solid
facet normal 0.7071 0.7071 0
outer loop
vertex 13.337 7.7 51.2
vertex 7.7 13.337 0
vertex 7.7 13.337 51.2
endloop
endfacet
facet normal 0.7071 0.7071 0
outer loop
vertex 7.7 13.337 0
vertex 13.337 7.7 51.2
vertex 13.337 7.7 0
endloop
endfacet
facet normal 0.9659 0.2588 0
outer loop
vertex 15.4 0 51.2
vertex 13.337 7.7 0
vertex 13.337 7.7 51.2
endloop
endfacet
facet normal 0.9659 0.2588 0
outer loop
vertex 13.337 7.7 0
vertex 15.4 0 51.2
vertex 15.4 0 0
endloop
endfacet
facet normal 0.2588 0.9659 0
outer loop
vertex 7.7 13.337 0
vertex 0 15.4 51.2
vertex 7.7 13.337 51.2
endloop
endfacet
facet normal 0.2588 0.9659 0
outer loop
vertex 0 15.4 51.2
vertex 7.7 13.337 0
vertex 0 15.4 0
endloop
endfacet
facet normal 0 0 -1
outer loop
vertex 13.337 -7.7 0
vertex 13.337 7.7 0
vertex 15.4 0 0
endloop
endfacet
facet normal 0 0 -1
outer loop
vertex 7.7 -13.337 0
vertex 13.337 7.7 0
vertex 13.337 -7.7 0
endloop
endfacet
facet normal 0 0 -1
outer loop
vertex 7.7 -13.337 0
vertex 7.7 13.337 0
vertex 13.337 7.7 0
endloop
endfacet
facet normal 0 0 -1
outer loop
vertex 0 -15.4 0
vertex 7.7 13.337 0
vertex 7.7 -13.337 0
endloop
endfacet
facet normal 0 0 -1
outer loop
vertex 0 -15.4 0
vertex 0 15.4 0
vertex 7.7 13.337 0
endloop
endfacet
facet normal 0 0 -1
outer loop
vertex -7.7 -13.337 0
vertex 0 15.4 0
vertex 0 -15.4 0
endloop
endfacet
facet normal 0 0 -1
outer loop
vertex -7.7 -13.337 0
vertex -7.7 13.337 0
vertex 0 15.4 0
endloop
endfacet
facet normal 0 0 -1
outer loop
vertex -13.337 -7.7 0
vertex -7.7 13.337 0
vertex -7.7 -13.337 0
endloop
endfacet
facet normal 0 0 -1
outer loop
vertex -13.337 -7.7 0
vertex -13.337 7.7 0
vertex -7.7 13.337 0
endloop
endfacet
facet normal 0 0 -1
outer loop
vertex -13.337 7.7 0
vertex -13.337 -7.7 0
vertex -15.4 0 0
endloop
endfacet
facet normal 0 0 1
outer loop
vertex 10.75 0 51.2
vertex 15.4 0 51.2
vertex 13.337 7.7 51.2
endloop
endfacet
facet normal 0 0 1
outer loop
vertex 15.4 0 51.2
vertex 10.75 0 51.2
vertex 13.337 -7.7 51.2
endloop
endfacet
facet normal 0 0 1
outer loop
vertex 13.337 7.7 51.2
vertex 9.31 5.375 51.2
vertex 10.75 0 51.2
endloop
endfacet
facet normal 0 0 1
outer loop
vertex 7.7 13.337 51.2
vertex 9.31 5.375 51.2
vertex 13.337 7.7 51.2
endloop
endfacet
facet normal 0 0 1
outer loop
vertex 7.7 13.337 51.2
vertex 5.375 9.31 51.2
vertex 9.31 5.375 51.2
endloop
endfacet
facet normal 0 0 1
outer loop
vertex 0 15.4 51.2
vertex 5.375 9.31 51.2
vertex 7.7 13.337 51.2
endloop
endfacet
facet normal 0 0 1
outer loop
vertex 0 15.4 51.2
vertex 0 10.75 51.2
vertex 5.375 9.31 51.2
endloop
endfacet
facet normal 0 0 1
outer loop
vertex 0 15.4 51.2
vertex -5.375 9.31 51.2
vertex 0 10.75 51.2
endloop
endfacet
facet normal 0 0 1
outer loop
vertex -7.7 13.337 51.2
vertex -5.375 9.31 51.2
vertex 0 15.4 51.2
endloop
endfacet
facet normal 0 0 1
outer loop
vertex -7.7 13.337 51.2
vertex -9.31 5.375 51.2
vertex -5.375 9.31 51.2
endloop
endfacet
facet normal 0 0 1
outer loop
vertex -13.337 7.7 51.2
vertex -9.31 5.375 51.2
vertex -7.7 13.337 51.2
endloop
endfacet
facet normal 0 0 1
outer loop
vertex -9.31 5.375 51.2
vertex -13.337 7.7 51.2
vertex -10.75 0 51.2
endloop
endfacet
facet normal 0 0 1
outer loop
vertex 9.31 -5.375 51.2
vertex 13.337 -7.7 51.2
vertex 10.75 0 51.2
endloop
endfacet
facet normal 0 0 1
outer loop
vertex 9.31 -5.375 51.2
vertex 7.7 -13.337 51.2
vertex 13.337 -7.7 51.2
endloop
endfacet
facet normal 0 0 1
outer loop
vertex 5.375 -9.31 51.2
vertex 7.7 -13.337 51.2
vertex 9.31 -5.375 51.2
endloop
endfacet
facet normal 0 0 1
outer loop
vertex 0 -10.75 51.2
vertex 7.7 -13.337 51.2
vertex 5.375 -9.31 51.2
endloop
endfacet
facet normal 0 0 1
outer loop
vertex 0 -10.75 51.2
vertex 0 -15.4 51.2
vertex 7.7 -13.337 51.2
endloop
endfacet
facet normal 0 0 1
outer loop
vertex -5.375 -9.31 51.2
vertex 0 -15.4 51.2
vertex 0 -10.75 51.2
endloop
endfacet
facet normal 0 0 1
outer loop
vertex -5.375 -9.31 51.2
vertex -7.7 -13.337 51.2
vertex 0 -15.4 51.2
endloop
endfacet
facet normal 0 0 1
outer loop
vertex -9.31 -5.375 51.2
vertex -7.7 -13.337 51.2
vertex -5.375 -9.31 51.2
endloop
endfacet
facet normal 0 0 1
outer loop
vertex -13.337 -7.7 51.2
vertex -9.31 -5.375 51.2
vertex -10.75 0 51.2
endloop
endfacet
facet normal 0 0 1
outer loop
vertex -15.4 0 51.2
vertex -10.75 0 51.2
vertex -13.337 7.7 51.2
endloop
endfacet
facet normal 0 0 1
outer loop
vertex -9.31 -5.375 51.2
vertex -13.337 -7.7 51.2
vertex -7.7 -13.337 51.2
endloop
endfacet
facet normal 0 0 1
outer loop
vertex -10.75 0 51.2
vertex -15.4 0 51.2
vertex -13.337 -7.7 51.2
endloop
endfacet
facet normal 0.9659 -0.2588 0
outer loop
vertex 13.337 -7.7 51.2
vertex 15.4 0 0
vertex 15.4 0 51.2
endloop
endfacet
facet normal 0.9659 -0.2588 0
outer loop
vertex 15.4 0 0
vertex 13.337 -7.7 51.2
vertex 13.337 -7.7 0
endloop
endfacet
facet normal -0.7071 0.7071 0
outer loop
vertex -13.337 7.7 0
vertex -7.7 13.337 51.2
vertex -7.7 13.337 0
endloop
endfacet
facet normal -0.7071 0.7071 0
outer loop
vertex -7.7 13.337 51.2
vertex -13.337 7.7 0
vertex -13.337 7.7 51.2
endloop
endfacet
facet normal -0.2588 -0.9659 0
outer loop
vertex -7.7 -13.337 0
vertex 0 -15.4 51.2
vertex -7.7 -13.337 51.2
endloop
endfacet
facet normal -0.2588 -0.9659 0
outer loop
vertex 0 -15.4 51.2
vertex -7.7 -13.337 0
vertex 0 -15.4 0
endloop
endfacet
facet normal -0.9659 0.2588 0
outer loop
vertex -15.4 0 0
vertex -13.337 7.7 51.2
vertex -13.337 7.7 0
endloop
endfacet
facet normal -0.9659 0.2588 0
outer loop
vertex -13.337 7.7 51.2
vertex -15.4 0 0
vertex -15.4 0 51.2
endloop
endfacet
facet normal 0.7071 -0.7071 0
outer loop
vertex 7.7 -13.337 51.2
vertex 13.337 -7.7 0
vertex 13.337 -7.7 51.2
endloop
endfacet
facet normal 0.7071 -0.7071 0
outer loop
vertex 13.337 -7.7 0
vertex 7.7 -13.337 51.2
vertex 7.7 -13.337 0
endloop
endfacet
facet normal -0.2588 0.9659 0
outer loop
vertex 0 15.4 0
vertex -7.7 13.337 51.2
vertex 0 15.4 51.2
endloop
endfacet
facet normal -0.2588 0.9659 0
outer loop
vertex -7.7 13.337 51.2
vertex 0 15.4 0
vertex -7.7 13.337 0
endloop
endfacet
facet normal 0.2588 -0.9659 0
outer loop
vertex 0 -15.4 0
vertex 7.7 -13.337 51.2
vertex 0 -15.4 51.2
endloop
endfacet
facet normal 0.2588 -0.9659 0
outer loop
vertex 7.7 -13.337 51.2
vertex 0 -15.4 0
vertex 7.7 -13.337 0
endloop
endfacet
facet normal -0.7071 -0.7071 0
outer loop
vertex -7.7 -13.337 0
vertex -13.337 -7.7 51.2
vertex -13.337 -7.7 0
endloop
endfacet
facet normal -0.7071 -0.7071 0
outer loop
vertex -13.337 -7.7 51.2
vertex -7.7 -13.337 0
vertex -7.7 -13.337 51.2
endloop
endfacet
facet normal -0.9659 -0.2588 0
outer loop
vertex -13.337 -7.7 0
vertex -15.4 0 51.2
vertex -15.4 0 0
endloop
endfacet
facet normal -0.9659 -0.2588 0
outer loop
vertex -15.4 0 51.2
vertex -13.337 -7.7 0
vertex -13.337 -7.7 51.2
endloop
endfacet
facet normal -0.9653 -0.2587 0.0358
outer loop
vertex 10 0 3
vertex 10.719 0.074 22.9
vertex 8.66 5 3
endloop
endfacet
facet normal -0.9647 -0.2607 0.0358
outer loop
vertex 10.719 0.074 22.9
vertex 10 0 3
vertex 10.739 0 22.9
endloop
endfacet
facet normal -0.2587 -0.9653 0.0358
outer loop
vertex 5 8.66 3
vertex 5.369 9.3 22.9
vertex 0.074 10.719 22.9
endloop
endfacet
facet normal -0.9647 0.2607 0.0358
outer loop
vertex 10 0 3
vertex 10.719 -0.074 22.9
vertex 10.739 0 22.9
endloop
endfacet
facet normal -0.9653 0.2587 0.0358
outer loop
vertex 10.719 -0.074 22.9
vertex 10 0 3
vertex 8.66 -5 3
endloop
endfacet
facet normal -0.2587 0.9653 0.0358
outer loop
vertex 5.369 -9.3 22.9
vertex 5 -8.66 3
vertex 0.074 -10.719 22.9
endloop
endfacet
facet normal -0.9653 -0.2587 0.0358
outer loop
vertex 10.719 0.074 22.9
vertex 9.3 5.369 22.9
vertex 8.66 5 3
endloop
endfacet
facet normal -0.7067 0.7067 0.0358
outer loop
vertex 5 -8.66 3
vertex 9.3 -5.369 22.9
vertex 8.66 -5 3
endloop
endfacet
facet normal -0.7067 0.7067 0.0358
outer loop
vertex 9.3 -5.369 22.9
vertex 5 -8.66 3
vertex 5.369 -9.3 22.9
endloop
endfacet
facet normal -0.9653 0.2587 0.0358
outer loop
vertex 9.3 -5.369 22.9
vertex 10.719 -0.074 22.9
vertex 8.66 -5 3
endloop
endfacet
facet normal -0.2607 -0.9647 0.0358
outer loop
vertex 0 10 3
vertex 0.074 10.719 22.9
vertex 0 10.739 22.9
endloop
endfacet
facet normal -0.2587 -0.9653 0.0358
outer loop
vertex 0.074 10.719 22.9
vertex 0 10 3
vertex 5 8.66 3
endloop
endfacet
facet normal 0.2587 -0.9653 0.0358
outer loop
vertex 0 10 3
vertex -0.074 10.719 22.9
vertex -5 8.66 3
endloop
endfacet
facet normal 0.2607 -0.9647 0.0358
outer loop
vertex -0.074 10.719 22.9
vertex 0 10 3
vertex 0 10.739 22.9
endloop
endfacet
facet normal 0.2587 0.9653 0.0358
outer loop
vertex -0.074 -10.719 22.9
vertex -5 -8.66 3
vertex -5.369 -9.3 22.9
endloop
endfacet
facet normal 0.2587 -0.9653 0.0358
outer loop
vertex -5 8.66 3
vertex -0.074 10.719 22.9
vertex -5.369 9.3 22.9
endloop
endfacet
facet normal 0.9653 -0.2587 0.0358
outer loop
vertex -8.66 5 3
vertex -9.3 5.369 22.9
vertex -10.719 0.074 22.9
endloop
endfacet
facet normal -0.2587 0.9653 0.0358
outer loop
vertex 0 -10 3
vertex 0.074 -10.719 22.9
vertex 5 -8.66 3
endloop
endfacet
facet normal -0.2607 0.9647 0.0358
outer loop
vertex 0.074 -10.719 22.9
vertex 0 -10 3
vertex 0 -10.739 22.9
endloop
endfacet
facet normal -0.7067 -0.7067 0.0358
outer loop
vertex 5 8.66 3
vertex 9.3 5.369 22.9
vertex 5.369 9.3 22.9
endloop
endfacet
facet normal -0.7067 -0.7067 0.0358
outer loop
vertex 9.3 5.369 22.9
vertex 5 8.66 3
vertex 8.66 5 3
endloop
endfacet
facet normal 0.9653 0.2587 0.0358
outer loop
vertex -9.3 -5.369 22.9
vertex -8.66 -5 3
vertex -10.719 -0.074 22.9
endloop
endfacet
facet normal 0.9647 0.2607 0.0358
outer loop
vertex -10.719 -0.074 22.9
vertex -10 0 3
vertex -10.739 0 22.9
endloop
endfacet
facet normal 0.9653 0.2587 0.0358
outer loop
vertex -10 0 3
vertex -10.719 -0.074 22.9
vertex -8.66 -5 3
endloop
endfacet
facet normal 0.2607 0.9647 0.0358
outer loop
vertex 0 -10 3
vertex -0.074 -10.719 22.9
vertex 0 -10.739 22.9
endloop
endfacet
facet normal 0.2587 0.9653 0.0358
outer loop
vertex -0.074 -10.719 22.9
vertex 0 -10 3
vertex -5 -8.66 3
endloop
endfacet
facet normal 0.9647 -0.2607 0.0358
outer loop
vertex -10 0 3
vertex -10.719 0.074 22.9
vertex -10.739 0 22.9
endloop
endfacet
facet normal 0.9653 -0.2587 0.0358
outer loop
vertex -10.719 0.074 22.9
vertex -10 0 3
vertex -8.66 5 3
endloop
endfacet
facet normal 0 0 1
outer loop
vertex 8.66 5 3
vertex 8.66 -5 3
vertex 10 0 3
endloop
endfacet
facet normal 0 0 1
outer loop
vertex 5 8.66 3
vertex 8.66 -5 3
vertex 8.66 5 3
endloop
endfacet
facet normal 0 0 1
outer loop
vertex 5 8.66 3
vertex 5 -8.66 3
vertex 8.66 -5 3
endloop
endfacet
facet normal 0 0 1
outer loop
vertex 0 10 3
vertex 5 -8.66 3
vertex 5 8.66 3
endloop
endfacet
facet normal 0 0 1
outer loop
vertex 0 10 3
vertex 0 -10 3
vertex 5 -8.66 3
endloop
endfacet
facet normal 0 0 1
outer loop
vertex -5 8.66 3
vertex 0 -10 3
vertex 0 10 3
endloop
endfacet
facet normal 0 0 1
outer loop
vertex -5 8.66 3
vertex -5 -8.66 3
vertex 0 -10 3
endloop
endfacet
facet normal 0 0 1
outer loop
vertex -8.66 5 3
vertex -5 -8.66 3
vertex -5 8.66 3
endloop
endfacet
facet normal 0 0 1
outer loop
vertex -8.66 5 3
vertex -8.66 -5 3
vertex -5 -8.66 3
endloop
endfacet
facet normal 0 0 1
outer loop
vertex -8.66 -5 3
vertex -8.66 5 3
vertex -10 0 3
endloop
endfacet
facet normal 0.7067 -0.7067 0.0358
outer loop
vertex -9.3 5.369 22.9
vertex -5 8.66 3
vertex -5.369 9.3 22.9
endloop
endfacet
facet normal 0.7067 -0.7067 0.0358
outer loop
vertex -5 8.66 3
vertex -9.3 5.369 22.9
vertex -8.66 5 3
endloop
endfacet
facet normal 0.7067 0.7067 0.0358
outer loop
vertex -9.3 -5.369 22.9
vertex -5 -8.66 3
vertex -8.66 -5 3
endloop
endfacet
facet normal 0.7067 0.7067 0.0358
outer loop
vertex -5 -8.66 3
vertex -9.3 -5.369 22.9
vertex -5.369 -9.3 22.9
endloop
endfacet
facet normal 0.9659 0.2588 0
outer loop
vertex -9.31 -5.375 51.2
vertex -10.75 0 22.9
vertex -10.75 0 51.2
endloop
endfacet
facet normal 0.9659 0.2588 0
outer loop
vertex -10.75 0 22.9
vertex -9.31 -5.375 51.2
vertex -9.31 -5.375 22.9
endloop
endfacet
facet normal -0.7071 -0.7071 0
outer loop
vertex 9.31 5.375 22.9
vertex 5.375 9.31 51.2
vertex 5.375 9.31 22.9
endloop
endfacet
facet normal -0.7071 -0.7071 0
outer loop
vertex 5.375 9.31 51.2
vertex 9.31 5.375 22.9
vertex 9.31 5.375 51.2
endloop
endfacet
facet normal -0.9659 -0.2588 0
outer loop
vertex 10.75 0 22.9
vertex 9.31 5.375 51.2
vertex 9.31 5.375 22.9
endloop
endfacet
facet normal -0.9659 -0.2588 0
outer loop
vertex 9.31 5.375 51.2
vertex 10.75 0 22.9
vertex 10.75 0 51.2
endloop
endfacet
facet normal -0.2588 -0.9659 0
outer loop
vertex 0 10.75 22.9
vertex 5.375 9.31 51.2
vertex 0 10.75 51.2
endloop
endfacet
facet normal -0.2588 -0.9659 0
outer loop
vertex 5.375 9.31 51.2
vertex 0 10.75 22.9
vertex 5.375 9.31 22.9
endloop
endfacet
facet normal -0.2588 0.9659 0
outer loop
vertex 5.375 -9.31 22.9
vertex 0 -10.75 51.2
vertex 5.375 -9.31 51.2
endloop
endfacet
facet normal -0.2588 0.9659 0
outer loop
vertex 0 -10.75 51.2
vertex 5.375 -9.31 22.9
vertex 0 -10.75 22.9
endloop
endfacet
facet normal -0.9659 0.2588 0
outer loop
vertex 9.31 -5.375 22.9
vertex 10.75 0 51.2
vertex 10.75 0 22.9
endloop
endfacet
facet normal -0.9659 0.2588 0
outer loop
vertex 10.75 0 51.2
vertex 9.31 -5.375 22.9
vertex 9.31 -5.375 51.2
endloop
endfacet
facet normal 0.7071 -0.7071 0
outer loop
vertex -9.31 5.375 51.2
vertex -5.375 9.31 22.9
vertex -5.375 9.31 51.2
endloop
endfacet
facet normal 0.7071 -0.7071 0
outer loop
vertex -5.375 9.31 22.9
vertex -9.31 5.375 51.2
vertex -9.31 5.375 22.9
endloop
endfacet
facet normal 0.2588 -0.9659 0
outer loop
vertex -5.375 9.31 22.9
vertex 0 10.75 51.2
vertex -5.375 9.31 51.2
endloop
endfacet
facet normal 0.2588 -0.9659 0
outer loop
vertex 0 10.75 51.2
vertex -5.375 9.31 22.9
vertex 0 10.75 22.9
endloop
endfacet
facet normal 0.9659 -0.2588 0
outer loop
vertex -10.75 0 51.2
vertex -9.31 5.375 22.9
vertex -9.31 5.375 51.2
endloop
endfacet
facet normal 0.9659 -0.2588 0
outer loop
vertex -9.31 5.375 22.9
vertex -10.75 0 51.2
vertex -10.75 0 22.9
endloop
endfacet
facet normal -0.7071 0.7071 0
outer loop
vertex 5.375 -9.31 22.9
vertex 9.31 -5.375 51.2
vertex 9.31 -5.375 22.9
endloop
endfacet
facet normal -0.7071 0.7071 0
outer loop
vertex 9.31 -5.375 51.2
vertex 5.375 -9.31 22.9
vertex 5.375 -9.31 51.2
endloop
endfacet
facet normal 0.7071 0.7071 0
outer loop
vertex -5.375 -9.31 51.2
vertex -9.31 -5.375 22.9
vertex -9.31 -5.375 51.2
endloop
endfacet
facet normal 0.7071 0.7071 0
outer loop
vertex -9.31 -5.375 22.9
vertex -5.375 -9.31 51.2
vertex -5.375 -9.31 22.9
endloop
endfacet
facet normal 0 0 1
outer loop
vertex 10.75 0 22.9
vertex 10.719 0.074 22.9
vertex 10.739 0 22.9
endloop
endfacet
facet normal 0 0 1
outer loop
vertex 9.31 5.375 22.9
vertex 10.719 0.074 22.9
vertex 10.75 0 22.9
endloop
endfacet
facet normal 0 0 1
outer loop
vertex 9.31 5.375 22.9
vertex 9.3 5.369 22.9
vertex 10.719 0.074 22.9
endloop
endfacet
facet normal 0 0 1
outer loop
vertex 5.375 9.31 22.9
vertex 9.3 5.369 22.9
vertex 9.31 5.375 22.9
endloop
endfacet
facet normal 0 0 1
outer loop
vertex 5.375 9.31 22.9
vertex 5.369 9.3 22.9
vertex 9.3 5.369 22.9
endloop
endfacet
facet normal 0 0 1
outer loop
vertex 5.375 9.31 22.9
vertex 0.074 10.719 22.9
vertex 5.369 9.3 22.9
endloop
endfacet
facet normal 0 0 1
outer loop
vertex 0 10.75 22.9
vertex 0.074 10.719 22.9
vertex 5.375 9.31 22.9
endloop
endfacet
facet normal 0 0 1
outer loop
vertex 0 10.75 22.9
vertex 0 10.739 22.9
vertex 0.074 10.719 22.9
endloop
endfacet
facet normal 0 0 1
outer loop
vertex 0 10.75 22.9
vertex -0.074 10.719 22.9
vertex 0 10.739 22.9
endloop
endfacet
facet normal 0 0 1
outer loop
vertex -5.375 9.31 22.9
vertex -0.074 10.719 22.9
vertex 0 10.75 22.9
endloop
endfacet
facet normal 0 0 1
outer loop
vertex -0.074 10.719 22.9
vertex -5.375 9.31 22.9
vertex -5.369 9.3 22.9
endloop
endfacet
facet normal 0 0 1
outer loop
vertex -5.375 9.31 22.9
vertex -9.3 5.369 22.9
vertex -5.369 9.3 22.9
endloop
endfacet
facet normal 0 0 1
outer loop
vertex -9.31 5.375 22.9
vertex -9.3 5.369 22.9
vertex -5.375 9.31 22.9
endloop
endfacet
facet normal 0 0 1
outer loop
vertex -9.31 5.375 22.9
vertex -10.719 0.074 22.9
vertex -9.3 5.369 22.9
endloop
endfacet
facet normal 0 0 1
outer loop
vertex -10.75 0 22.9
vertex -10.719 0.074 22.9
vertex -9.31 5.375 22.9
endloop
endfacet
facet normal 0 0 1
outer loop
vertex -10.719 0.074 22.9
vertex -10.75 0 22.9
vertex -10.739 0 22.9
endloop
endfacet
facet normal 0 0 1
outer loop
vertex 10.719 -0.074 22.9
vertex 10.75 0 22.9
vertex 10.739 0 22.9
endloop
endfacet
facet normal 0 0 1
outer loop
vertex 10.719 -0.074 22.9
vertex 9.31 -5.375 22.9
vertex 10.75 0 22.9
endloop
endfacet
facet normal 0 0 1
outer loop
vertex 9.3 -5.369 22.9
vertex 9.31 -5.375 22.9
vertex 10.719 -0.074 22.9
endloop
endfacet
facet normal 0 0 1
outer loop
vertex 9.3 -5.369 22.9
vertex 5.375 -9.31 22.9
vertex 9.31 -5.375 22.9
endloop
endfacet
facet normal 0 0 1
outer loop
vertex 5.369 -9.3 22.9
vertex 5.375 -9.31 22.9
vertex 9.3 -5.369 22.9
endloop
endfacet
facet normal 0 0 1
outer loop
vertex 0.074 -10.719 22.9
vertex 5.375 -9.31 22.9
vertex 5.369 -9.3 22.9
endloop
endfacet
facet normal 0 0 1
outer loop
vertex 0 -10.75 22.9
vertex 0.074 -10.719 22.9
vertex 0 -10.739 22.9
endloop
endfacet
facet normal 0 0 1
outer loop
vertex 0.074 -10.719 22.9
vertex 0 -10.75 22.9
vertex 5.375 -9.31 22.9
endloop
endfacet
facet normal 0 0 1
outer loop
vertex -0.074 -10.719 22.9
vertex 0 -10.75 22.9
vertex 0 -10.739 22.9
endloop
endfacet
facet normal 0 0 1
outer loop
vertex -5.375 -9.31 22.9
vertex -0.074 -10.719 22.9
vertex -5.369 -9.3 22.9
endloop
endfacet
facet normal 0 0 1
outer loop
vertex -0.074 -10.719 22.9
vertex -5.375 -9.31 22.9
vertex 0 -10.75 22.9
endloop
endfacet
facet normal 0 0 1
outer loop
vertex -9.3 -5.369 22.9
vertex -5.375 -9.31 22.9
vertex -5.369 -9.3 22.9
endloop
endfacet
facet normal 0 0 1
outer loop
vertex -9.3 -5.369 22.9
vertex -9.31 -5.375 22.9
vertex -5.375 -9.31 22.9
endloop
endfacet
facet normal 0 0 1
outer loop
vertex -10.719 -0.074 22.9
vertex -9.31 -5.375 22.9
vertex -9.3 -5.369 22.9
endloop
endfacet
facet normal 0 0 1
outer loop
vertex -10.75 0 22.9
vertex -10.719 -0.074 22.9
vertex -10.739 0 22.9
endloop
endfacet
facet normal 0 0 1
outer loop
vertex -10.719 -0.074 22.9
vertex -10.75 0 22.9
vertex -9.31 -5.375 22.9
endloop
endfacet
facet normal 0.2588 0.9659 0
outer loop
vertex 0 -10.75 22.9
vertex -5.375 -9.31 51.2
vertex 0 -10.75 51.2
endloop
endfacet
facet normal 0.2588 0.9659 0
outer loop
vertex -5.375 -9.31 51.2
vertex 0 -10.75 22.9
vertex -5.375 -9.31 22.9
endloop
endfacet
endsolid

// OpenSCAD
//
// Adapter for a bird feeder to a pipe
//

// The only thing to note about this is that we make $fn low on purpose.
// It helps the print to deform in place. So, print with 15% fill.

// Sasuga chinese designers, the sizes are this round.
feeder_d = 30.0 + 0.8;
feeder_z = 50.0 + 1.2;

roof_th = 3.0;

// Internet says the diameter of a 1/2" lead pipe is 22.17 mm.
// But in reality it's 21.50. Someone's saving on material.
pipe_d1 = 20.0;
pipe_d2 = 21.5;
pipe_z1 = 20.0;
pipe_z2 = feeder_z - roof_th - pipe_z1;

module main () {
    difference () {
        cylinder(feeder_z, r=feeder_d/2, $fn=12);
        translate([0, 0, roof_th])
            cylinder(pipe_z1 + 0.2, pipe_d1/2, pipe_d2/2, $fn=12);
        translate([0, 0, roof_th + pipe_z1 - 0.1])
            cylinder(pipe_z2 + 0.2, r=pipe_d2/2, $fn=12);
    }
}

main();
